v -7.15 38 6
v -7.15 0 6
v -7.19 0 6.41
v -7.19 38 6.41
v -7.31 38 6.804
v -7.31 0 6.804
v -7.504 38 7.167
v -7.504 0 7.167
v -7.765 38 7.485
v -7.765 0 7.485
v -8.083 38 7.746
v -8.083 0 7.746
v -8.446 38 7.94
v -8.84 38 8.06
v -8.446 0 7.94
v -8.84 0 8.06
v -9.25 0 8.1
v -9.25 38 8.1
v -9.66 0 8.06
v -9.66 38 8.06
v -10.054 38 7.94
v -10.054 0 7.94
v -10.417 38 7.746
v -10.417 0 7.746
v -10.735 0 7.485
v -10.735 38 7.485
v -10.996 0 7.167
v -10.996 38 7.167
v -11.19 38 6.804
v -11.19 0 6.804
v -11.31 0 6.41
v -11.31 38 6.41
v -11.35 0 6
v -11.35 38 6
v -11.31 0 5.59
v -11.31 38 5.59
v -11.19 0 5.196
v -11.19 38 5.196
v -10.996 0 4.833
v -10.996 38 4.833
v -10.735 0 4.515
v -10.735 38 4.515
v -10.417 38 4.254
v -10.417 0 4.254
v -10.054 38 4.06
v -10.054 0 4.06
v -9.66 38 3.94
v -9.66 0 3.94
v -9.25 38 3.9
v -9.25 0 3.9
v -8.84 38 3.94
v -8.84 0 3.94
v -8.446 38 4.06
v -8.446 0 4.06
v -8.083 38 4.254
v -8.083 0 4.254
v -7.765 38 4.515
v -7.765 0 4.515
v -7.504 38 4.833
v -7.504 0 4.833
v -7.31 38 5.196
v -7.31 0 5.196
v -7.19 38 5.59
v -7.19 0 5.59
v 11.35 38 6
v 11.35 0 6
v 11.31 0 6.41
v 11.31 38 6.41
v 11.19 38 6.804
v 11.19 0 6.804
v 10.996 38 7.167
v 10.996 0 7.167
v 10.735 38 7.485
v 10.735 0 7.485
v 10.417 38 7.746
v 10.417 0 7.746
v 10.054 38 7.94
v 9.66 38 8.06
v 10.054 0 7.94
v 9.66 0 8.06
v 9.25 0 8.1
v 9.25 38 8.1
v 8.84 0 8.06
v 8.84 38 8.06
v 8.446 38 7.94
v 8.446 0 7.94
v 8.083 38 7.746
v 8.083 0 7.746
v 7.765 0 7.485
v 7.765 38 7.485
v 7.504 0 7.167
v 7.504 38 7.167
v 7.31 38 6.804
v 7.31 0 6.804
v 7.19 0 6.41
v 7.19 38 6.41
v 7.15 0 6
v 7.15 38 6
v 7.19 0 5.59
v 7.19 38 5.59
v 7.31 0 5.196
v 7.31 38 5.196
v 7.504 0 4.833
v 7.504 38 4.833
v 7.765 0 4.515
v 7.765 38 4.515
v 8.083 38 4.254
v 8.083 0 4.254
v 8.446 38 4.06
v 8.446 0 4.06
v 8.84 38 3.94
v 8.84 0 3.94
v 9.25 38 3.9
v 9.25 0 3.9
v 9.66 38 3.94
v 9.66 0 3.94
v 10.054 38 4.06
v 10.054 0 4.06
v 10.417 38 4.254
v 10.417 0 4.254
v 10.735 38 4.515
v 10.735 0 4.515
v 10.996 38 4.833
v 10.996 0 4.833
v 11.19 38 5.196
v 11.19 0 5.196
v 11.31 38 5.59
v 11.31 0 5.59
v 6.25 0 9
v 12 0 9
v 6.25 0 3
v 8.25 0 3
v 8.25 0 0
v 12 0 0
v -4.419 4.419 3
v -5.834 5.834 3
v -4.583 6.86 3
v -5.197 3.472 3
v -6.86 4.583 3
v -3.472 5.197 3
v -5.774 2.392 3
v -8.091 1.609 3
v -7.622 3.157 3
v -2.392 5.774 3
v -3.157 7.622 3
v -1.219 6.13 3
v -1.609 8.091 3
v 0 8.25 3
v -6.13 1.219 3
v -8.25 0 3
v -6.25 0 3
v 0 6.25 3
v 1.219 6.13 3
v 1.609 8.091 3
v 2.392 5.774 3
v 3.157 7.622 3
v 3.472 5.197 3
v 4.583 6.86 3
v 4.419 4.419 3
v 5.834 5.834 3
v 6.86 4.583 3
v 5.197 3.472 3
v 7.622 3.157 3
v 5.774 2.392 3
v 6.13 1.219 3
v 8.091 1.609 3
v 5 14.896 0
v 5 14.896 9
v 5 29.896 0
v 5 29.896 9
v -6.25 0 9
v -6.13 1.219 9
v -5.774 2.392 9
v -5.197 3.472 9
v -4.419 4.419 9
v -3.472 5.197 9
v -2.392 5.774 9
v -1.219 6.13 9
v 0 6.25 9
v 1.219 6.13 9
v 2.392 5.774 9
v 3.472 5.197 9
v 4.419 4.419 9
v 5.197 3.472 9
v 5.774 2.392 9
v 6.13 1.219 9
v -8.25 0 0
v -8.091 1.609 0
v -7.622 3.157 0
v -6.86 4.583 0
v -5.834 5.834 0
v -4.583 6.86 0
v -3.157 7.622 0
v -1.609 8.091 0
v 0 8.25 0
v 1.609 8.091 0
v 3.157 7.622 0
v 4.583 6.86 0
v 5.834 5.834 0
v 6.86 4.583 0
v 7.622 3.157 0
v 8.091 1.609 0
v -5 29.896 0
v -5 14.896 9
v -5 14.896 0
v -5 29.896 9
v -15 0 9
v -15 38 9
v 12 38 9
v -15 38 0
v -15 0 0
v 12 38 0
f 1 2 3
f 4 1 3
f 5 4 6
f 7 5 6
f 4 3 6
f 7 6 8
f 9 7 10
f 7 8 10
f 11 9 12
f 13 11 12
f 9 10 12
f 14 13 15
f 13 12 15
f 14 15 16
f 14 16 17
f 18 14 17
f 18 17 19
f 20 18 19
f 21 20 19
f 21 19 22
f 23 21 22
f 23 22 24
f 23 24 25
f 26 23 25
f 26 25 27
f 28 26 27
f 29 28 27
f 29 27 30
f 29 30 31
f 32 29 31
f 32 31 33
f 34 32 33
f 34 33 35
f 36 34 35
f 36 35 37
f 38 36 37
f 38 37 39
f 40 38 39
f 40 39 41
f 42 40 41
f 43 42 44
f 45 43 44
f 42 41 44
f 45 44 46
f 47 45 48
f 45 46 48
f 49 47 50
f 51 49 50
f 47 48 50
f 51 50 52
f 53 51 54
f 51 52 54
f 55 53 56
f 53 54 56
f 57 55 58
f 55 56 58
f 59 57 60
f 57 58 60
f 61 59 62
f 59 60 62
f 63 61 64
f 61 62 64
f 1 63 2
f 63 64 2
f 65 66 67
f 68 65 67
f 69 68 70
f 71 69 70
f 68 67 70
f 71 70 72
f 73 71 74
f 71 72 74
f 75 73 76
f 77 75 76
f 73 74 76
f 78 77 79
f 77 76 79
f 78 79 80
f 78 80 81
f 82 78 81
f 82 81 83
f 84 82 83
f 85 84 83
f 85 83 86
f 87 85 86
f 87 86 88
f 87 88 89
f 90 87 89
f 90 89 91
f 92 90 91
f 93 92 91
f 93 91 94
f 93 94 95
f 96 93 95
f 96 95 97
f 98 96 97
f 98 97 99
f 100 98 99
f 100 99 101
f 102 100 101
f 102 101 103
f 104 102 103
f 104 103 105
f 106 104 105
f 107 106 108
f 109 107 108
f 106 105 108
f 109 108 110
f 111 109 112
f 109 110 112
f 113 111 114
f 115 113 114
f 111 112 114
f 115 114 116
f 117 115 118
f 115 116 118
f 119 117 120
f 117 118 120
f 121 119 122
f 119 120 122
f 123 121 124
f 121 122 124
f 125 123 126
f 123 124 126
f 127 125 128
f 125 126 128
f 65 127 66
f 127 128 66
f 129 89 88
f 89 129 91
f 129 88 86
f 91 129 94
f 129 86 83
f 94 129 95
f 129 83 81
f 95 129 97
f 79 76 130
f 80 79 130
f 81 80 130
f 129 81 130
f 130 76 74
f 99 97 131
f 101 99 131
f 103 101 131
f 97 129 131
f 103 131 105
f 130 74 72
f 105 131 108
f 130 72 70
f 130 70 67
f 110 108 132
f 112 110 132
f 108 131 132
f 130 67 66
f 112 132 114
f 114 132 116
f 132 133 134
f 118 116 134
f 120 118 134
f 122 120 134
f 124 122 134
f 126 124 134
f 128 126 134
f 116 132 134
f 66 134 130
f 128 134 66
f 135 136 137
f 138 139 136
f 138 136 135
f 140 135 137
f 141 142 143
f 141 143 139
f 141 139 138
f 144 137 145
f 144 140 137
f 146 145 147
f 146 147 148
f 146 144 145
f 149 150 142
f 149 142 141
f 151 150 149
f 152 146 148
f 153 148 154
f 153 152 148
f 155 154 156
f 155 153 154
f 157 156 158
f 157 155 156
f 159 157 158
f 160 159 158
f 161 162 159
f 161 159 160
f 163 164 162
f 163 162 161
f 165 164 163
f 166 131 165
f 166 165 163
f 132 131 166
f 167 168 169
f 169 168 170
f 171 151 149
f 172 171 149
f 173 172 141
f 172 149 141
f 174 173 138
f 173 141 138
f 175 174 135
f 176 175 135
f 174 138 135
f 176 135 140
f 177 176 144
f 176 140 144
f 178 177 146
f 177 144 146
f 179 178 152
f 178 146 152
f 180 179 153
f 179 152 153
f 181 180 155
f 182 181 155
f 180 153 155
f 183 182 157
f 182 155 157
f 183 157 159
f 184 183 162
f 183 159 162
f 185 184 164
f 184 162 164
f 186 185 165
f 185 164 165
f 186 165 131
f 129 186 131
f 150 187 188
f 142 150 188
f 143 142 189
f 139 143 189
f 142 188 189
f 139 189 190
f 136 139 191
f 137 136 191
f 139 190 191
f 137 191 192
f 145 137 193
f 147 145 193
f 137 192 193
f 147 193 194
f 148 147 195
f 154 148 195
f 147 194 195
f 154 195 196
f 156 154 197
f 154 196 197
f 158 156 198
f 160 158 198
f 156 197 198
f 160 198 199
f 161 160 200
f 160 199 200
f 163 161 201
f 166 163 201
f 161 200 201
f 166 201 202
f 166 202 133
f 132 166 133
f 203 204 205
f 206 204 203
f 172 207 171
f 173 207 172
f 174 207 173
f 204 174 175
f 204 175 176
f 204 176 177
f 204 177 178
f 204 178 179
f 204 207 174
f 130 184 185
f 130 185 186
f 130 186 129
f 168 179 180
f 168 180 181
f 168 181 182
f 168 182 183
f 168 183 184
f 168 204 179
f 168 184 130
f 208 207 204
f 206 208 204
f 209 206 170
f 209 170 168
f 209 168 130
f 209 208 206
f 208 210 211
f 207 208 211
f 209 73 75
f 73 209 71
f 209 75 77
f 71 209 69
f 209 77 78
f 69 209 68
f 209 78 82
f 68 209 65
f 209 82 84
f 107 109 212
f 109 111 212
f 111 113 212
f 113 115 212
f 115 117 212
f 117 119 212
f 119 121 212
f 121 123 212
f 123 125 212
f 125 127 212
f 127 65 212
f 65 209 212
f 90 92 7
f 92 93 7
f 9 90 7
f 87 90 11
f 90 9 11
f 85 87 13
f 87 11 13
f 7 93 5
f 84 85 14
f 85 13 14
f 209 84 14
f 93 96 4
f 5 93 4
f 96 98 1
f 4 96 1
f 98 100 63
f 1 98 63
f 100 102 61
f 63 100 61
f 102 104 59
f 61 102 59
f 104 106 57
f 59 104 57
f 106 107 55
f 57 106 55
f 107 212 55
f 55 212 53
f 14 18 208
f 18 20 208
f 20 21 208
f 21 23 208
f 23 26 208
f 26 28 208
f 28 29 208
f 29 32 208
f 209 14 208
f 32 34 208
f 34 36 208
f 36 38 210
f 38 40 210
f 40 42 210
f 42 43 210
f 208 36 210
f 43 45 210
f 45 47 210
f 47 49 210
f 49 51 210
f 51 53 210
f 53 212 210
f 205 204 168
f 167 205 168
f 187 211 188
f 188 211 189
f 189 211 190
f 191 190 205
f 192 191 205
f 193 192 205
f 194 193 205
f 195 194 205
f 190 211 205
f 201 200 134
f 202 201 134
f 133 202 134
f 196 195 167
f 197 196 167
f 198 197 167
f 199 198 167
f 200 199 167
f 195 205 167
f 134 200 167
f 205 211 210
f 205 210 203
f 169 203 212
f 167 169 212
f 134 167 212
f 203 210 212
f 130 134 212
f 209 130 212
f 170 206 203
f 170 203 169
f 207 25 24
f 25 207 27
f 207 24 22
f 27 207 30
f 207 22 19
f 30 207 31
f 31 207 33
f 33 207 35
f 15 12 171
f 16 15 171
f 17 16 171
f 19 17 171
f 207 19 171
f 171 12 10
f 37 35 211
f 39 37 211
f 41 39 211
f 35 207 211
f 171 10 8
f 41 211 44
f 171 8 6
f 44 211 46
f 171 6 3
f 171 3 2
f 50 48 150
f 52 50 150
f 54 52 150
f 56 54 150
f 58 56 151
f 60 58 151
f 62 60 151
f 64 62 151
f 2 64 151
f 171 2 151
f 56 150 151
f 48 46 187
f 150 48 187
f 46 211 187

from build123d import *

# Parameters (mm, degrees)
F1_DEPTH = 9
F3_DEPTH = 3
F4_R     = 2.1
F5_DEPTH = 38.001
F6_W     = 10
F6_H     = 15
F7_DEPTH = 9.001


with BuildPart() as f1:
    # F0 (on Top) → F1 (new body)
    with BuildSketch(Plane.XY):
        with BuildLine():
            Line((-15, 38), (-15, 0))
            Line((-15, 0), (-6.25, 0))
            ThreePointArc((-6.25, 0), (0, 6.25), (6.25, 0))
            Line((6.25, 0), (12, 0))
            Line((12, 0), (12, 38))
            Line((12, 38), (-15, 38))
        make_face()
    extrude(amount=F1_DEPTH)

    # F2 (on face) → F3 (cut)
    with BuildSketch(Plane(origin=(0, 0, 0), x_dir=(1, 0, 0), z_dir=(0, 0, -1))):
        with BuildLine():
            ThreePointArc((6.25, 0), (0, -6.25), (-6.25, 0))
            Line((-6.25, 0), (-8.25, 0))
            ThreePointArc((-8.25, 0), (0, -8.25), (8.25, 0))
            Line((8.25, 0), (6.25, 0))
        make_face()
    extrude(amount=-F3_DEPTH, mode=Mode.SUBTRACT)

    # F4 (on Front) → F5 (cut, through all)
    with BuildSketch(Plane.XZ):
        with Locations((-9.25, 6)):
            Circle(F4_R)
        with Locations((9.25, 6)):
            Circle(F4_R)
    extrude(amount=-F5_DEPTH, mode=Mode.SUBTRACT)

    # F6 (on face) → F7 (cut, through all)
    with BuildSketch(Plane.XY.offset(9)):
        with Locations((0, 22.395955)):
            Rectangle(F6_W, F6_H)
    extrude(amount=-F7_DEPTH, mode=Mode.SUBTRACT)


solid = f1.part
